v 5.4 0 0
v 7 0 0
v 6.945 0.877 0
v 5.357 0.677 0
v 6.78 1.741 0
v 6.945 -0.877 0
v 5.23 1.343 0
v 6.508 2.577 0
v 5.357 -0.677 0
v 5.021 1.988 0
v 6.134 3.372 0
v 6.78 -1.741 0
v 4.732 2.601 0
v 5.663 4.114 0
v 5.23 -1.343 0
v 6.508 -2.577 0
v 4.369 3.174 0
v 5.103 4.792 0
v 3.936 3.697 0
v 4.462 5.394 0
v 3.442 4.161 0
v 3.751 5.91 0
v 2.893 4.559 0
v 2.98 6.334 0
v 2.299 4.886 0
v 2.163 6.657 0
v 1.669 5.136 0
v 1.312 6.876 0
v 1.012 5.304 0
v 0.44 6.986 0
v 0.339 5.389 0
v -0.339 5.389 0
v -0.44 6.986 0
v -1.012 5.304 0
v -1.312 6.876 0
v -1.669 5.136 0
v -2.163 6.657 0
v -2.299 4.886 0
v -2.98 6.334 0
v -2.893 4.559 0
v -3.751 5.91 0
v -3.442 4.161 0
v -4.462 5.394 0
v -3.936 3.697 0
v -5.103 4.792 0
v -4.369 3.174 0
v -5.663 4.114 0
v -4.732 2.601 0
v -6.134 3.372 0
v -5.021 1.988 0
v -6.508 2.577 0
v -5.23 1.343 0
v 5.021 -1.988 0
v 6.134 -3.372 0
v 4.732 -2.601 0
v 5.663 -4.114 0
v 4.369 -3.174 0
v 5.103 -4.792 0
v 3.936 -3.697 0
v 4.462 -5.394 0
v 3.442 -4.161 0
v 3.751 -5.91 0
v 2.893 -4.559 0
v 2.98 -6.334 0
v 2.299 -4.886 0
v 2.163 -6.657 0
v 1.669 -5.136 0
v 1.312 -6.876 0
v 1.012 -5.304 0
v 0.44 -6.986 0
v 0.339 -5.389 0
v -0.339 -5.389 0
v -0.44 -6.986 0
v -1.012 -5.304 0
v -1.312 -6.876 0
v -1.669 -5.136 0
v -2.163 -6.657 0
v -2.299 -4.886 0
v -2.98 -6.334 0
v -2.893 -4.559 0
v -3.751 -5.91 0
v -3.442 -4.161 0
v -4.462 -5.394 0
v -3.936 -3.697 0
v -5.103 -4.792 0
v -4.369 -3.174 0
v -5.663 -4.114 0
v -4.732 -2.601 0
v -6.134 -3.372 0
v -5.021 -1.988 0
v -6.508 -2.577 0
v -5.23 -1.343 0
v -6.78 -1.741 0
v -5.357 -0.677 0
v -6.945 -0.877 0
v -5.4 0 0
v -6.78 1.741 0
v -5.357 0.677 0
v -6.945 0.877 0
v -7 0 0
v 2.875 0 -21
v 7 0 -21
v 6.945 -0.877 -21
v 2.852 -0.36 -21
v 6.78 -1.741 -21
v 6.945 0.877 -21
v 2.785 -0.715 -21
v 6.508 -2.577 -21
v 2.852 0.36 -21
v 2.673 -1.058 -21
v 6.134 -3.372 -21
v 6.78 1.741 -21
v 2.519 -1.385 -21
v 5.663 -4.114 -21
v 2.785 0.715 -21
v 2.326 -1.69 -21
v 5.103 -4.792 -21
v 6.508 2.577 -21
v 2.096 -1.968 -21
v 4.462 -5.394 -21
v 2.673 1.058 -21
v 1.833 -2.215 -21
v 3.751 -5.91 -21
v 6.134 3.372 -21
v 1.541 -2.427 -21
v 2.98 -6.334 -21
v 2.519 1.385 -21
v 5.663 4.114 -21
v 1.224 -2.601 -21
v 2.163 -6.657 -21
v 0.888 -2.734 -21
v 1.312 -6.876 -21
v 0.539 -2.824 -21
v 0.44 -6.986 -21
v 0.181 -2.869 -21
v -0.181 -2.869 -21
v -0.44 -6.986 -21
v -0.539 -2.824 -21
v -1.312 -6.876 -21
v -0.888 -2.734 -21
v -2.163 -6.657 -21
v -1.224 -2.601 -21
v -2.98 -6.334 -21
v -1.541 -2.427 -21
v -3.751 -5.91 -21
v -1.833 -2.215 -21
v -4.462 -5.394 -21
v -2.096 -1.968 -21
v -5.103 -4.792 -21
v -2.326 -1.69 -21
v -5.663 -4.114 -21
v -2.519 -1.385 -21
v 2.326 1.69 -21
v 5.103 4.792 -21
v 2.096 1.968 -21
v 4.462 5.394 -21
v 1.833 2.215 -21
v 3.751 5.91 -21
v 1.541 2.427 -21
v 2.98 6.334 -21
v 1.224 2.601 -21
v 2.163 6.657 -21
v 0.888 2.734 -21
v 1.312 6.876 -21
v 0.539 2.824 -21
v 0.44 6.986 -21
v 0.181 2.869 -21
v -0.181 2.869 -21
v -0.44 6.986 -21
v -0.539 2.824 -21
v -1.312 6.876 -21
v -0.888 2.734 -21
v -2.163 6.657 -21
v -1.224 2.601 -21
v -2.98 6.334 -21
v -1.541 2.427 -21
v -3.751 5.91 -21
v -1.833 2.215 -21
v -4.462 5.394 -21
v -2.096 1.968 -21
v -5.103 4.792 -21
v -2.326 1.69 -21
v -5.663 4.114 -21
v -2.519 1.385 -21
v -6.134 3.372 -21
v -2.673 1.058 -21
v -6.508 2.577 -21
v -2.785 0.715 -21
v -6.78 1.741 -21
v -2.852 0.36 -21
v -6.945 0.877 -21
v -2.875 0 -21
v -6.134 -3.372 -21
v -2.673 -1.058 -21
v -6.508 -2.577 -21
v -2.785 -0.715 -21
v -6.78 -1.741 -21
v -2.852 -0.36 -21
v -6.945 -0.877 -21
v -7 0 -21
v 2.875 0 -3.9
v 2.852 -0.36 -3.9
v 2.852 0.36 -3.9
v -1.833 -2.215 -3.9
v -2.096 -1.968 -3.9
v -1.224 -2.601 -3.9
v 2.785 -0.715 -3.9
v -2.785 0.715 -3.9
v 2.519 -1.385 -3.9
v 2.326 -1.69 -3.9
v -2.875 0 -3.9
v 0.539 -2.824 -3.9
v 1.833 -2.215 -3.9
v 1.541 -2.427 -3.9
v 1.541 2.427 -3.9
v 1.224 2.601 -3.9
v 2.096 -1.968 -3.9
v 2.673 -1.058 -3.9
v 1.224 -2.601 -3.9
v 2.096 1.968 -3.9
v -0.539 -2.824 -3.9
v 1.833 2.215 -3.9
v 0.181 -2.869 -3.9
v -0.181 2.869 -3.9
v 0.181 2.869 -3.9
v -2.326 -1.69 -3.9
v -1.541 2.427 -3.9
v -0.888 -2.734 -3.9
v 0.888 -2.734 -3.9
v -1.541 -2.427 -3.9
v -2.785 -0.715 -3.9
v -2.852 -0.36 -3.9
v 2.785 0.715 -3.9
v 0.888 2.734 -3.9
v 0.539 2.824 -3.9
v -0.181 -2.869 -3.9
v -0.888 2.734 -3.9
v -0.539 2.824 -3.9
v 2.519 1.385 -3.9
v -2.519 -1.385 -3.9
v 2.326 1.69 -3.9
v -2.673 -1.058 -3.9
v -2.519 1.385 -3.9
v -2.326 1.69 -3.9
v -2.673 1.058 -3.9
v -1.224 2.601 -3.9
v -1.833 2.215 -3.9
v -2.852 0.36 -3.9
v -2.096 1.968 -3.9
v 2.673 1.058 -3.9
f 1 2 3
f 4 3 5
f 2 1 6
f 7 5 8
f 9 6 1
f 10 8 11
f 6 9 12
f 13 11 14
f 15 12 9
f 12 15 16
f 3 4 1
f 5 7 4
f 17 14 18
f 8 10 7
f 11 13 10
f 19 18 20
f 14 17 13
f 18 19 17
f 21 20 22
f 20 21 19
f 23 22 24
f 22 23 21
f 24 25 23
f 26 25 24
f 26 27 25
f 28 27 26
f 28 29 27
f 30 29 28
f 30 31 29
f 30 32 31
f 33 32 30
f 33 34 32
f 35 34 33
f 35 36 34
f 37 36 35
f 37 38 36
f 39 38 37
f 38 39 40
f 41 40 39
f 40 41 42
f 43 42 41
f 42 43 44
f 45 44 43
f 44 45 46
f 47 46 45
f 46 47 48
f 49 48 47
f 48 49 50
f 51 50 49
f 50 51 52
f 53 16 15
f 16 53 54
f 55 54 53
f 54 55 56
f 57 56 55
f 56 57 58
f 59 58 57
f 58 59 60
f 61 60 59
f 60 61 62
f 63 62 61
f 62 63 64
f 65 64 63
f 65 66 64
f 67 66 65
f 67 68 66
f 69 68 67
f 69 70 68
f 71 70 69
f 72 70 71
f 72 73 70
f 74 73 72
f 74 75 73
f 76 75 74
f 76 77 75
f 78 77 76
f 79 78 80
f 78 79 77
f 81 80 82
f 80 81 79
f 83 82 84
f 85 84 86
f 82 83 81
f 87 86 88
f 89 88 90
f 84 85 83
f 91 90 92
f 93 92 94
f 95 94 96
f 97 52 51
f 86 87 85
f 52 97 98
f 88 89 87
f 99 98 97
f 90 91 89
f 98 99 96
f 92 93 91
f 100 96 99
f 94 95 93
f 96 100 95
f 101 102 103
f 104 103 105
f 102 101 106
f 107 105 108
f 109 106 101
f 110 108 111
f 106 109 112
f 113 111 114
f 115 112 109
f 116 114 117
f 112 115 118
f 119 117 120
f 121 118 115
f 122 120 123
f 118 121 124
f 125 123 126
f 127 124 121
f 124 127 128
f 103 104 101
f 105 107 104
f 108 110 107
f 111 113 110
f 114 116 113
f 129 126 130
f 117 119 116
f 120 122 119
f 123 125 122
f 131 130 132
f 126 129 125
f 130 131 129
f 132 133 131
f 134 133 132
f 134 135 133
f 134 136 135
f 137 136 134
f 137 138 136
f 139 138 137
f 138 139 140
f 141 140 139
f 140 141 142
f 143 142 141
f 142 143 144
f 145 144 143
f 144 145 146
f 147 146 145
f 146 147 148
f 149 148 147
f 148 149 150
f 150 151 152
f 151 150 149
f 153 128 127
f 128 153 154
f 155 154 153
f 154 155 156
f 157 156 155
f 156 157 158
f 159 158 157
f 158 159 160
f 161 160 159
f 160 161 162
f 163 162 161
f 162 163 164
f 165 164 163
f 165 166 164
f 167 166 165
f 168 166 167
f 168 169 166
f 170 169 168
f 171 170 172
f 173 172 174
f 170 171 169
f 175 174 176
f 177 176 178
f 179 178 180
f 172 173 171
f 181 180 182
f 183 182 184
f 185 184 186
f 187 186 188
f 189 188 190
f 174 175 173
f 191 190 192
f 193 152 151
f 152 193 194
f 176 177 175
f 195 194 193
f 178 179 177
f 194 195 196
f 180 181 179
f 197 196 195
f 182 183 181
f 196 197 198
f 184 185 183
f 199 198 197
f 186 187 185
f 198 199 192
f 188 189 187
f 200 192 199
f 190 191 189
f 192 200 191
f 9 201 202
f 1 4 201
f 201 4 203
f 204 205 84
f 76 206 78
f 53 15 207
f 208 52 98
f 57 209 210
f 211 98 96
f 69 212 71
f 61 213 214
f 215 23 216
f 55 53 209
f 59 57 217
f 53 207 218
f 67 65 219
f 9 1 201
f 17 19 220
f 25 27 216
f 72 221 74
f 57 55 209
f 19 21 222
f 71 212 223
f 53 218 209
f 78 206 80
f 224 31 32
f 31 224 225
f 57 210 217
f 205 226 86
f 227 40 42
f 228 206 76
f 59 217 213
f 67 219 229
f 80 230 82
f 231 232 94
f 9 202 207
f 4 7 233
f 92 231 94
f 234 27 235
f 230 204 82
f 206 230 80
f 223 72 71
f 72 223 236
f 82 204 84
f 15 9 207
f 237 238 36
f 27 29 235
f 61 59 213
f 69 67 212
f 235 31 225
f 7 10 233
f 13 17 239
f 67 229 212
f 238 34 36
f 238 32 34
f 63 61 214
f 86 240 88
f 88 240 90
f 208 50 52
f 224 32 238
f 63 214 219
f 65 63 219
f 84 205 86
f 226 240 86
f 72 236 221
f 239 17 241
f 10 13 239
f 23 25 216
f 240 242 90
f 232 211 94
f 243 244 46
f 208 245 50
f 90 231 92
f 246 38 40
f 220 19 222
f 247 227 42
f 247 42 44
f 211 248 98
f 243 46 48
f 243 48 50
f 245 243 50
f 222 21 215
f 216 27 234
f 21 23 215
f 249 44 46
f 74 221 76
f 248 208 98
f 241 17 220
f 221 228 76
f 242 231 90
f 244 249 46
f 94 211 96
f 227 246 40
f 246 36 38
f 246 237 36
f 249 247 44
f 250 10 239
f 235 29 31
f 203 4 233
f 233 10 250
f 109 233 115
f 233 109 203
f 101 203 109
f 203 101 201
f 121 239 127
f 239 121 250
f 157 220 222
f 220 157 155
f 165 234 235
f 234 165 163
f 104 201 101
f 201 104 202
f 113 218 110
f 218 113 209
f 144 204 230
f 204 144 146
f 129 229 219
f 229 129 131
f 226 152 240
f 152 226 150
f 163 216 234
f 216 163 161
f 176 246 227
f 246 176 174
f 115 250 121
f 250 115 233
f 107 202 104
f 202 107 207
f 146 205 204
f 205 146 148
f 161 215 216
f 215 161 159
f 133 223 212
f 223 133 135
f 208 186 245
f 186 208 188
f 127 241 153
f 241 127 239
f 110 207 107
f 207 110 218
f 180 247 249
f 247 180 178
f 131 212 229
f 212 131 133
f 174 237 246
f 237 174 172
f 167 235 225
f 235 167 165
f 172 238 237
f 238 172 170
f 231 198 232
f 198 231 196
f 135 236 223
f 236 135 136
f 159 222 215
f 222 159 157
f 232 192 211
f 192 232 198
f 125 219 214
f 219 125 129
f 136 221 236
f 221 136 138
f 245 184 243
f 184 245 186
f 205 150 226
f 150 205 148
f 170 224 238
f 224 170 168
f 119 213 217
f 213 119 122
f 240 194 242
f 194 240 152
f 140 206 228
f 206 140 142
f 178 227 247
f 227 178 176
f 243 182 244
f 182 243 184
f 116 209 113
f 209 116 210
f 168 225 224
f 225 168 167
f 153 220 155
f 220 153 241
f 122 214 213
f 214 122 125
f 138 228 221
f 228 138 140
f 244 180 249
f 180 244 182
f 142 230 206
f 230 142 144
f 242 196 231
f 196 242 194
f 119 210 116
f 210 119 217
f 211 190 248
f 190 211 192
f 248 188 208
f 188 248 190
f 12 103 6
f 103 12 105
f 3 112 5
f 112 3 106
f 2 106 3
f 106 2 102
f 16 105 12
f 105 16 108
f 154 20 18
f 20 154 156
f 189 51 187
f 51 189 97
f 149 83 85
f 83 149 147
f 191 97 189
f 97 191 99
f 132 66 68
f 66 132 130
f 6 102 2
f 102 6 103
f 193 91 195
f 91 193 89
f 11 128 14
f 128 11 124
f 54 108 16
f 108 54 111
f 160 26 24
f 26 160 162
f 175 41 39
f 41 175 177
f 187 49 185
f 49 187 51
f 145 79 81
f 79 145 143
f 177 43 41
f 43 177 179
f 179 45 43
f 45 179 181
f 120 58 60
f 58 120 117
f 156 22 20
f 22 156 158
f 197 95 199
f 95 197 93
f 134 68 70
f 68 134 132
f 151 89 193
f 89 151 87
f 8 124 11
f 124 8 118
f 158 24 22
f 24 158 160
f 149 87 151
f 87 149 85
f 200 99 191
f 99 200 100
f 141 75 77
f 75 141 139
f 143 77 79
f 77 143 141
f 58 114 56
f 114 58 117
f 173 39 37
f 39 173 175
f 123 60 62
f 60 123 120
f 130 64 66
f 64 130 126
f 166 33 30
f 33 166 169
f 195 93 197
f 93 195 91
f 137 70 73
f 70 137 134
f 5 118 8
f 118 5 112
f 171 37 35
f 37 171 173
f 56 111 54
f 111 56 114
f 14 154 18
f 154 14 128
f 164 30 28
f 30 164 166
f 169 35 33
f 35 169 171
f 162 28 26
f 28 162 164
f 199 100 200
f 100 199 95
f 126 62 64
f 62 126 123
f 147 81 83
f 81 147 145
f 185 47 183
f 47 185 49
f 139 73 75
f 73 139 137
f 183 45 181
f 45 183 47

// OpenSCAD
$fn = 50;


difference() {
	union() {
		translate(v = [0, 0, -21.0000000000]) {
			cylinder(h = 21, r = 7.0000000000);
		}
	}
	union() {
		translate(v = [0, 0, 0]) {
			rotate(a = [0, 0, 0]) {
				difference() {
					union() {
						#translate(v = [0, 0, -21.0000000000]) {
							cylinder(h = 21, r = 2.6000000000);
						}
						#translate(v = [0, 0, -3.9000000000]) {
							cylinder(h = 3.9000000000, r1 = 2.8750000000, r2 = 5.4000000000);
						}
						#translate(v = [0, 0, -21.0000000000]) {
							cylinder(h = 21, r = 2.8750000000);
						}
						#translate(v = [0, 0, -21.0000000000]) {
							cylinder(h = 21, r = 2.6000000000);
						}
					}
					union();
				}
			}
		}
	}
}
